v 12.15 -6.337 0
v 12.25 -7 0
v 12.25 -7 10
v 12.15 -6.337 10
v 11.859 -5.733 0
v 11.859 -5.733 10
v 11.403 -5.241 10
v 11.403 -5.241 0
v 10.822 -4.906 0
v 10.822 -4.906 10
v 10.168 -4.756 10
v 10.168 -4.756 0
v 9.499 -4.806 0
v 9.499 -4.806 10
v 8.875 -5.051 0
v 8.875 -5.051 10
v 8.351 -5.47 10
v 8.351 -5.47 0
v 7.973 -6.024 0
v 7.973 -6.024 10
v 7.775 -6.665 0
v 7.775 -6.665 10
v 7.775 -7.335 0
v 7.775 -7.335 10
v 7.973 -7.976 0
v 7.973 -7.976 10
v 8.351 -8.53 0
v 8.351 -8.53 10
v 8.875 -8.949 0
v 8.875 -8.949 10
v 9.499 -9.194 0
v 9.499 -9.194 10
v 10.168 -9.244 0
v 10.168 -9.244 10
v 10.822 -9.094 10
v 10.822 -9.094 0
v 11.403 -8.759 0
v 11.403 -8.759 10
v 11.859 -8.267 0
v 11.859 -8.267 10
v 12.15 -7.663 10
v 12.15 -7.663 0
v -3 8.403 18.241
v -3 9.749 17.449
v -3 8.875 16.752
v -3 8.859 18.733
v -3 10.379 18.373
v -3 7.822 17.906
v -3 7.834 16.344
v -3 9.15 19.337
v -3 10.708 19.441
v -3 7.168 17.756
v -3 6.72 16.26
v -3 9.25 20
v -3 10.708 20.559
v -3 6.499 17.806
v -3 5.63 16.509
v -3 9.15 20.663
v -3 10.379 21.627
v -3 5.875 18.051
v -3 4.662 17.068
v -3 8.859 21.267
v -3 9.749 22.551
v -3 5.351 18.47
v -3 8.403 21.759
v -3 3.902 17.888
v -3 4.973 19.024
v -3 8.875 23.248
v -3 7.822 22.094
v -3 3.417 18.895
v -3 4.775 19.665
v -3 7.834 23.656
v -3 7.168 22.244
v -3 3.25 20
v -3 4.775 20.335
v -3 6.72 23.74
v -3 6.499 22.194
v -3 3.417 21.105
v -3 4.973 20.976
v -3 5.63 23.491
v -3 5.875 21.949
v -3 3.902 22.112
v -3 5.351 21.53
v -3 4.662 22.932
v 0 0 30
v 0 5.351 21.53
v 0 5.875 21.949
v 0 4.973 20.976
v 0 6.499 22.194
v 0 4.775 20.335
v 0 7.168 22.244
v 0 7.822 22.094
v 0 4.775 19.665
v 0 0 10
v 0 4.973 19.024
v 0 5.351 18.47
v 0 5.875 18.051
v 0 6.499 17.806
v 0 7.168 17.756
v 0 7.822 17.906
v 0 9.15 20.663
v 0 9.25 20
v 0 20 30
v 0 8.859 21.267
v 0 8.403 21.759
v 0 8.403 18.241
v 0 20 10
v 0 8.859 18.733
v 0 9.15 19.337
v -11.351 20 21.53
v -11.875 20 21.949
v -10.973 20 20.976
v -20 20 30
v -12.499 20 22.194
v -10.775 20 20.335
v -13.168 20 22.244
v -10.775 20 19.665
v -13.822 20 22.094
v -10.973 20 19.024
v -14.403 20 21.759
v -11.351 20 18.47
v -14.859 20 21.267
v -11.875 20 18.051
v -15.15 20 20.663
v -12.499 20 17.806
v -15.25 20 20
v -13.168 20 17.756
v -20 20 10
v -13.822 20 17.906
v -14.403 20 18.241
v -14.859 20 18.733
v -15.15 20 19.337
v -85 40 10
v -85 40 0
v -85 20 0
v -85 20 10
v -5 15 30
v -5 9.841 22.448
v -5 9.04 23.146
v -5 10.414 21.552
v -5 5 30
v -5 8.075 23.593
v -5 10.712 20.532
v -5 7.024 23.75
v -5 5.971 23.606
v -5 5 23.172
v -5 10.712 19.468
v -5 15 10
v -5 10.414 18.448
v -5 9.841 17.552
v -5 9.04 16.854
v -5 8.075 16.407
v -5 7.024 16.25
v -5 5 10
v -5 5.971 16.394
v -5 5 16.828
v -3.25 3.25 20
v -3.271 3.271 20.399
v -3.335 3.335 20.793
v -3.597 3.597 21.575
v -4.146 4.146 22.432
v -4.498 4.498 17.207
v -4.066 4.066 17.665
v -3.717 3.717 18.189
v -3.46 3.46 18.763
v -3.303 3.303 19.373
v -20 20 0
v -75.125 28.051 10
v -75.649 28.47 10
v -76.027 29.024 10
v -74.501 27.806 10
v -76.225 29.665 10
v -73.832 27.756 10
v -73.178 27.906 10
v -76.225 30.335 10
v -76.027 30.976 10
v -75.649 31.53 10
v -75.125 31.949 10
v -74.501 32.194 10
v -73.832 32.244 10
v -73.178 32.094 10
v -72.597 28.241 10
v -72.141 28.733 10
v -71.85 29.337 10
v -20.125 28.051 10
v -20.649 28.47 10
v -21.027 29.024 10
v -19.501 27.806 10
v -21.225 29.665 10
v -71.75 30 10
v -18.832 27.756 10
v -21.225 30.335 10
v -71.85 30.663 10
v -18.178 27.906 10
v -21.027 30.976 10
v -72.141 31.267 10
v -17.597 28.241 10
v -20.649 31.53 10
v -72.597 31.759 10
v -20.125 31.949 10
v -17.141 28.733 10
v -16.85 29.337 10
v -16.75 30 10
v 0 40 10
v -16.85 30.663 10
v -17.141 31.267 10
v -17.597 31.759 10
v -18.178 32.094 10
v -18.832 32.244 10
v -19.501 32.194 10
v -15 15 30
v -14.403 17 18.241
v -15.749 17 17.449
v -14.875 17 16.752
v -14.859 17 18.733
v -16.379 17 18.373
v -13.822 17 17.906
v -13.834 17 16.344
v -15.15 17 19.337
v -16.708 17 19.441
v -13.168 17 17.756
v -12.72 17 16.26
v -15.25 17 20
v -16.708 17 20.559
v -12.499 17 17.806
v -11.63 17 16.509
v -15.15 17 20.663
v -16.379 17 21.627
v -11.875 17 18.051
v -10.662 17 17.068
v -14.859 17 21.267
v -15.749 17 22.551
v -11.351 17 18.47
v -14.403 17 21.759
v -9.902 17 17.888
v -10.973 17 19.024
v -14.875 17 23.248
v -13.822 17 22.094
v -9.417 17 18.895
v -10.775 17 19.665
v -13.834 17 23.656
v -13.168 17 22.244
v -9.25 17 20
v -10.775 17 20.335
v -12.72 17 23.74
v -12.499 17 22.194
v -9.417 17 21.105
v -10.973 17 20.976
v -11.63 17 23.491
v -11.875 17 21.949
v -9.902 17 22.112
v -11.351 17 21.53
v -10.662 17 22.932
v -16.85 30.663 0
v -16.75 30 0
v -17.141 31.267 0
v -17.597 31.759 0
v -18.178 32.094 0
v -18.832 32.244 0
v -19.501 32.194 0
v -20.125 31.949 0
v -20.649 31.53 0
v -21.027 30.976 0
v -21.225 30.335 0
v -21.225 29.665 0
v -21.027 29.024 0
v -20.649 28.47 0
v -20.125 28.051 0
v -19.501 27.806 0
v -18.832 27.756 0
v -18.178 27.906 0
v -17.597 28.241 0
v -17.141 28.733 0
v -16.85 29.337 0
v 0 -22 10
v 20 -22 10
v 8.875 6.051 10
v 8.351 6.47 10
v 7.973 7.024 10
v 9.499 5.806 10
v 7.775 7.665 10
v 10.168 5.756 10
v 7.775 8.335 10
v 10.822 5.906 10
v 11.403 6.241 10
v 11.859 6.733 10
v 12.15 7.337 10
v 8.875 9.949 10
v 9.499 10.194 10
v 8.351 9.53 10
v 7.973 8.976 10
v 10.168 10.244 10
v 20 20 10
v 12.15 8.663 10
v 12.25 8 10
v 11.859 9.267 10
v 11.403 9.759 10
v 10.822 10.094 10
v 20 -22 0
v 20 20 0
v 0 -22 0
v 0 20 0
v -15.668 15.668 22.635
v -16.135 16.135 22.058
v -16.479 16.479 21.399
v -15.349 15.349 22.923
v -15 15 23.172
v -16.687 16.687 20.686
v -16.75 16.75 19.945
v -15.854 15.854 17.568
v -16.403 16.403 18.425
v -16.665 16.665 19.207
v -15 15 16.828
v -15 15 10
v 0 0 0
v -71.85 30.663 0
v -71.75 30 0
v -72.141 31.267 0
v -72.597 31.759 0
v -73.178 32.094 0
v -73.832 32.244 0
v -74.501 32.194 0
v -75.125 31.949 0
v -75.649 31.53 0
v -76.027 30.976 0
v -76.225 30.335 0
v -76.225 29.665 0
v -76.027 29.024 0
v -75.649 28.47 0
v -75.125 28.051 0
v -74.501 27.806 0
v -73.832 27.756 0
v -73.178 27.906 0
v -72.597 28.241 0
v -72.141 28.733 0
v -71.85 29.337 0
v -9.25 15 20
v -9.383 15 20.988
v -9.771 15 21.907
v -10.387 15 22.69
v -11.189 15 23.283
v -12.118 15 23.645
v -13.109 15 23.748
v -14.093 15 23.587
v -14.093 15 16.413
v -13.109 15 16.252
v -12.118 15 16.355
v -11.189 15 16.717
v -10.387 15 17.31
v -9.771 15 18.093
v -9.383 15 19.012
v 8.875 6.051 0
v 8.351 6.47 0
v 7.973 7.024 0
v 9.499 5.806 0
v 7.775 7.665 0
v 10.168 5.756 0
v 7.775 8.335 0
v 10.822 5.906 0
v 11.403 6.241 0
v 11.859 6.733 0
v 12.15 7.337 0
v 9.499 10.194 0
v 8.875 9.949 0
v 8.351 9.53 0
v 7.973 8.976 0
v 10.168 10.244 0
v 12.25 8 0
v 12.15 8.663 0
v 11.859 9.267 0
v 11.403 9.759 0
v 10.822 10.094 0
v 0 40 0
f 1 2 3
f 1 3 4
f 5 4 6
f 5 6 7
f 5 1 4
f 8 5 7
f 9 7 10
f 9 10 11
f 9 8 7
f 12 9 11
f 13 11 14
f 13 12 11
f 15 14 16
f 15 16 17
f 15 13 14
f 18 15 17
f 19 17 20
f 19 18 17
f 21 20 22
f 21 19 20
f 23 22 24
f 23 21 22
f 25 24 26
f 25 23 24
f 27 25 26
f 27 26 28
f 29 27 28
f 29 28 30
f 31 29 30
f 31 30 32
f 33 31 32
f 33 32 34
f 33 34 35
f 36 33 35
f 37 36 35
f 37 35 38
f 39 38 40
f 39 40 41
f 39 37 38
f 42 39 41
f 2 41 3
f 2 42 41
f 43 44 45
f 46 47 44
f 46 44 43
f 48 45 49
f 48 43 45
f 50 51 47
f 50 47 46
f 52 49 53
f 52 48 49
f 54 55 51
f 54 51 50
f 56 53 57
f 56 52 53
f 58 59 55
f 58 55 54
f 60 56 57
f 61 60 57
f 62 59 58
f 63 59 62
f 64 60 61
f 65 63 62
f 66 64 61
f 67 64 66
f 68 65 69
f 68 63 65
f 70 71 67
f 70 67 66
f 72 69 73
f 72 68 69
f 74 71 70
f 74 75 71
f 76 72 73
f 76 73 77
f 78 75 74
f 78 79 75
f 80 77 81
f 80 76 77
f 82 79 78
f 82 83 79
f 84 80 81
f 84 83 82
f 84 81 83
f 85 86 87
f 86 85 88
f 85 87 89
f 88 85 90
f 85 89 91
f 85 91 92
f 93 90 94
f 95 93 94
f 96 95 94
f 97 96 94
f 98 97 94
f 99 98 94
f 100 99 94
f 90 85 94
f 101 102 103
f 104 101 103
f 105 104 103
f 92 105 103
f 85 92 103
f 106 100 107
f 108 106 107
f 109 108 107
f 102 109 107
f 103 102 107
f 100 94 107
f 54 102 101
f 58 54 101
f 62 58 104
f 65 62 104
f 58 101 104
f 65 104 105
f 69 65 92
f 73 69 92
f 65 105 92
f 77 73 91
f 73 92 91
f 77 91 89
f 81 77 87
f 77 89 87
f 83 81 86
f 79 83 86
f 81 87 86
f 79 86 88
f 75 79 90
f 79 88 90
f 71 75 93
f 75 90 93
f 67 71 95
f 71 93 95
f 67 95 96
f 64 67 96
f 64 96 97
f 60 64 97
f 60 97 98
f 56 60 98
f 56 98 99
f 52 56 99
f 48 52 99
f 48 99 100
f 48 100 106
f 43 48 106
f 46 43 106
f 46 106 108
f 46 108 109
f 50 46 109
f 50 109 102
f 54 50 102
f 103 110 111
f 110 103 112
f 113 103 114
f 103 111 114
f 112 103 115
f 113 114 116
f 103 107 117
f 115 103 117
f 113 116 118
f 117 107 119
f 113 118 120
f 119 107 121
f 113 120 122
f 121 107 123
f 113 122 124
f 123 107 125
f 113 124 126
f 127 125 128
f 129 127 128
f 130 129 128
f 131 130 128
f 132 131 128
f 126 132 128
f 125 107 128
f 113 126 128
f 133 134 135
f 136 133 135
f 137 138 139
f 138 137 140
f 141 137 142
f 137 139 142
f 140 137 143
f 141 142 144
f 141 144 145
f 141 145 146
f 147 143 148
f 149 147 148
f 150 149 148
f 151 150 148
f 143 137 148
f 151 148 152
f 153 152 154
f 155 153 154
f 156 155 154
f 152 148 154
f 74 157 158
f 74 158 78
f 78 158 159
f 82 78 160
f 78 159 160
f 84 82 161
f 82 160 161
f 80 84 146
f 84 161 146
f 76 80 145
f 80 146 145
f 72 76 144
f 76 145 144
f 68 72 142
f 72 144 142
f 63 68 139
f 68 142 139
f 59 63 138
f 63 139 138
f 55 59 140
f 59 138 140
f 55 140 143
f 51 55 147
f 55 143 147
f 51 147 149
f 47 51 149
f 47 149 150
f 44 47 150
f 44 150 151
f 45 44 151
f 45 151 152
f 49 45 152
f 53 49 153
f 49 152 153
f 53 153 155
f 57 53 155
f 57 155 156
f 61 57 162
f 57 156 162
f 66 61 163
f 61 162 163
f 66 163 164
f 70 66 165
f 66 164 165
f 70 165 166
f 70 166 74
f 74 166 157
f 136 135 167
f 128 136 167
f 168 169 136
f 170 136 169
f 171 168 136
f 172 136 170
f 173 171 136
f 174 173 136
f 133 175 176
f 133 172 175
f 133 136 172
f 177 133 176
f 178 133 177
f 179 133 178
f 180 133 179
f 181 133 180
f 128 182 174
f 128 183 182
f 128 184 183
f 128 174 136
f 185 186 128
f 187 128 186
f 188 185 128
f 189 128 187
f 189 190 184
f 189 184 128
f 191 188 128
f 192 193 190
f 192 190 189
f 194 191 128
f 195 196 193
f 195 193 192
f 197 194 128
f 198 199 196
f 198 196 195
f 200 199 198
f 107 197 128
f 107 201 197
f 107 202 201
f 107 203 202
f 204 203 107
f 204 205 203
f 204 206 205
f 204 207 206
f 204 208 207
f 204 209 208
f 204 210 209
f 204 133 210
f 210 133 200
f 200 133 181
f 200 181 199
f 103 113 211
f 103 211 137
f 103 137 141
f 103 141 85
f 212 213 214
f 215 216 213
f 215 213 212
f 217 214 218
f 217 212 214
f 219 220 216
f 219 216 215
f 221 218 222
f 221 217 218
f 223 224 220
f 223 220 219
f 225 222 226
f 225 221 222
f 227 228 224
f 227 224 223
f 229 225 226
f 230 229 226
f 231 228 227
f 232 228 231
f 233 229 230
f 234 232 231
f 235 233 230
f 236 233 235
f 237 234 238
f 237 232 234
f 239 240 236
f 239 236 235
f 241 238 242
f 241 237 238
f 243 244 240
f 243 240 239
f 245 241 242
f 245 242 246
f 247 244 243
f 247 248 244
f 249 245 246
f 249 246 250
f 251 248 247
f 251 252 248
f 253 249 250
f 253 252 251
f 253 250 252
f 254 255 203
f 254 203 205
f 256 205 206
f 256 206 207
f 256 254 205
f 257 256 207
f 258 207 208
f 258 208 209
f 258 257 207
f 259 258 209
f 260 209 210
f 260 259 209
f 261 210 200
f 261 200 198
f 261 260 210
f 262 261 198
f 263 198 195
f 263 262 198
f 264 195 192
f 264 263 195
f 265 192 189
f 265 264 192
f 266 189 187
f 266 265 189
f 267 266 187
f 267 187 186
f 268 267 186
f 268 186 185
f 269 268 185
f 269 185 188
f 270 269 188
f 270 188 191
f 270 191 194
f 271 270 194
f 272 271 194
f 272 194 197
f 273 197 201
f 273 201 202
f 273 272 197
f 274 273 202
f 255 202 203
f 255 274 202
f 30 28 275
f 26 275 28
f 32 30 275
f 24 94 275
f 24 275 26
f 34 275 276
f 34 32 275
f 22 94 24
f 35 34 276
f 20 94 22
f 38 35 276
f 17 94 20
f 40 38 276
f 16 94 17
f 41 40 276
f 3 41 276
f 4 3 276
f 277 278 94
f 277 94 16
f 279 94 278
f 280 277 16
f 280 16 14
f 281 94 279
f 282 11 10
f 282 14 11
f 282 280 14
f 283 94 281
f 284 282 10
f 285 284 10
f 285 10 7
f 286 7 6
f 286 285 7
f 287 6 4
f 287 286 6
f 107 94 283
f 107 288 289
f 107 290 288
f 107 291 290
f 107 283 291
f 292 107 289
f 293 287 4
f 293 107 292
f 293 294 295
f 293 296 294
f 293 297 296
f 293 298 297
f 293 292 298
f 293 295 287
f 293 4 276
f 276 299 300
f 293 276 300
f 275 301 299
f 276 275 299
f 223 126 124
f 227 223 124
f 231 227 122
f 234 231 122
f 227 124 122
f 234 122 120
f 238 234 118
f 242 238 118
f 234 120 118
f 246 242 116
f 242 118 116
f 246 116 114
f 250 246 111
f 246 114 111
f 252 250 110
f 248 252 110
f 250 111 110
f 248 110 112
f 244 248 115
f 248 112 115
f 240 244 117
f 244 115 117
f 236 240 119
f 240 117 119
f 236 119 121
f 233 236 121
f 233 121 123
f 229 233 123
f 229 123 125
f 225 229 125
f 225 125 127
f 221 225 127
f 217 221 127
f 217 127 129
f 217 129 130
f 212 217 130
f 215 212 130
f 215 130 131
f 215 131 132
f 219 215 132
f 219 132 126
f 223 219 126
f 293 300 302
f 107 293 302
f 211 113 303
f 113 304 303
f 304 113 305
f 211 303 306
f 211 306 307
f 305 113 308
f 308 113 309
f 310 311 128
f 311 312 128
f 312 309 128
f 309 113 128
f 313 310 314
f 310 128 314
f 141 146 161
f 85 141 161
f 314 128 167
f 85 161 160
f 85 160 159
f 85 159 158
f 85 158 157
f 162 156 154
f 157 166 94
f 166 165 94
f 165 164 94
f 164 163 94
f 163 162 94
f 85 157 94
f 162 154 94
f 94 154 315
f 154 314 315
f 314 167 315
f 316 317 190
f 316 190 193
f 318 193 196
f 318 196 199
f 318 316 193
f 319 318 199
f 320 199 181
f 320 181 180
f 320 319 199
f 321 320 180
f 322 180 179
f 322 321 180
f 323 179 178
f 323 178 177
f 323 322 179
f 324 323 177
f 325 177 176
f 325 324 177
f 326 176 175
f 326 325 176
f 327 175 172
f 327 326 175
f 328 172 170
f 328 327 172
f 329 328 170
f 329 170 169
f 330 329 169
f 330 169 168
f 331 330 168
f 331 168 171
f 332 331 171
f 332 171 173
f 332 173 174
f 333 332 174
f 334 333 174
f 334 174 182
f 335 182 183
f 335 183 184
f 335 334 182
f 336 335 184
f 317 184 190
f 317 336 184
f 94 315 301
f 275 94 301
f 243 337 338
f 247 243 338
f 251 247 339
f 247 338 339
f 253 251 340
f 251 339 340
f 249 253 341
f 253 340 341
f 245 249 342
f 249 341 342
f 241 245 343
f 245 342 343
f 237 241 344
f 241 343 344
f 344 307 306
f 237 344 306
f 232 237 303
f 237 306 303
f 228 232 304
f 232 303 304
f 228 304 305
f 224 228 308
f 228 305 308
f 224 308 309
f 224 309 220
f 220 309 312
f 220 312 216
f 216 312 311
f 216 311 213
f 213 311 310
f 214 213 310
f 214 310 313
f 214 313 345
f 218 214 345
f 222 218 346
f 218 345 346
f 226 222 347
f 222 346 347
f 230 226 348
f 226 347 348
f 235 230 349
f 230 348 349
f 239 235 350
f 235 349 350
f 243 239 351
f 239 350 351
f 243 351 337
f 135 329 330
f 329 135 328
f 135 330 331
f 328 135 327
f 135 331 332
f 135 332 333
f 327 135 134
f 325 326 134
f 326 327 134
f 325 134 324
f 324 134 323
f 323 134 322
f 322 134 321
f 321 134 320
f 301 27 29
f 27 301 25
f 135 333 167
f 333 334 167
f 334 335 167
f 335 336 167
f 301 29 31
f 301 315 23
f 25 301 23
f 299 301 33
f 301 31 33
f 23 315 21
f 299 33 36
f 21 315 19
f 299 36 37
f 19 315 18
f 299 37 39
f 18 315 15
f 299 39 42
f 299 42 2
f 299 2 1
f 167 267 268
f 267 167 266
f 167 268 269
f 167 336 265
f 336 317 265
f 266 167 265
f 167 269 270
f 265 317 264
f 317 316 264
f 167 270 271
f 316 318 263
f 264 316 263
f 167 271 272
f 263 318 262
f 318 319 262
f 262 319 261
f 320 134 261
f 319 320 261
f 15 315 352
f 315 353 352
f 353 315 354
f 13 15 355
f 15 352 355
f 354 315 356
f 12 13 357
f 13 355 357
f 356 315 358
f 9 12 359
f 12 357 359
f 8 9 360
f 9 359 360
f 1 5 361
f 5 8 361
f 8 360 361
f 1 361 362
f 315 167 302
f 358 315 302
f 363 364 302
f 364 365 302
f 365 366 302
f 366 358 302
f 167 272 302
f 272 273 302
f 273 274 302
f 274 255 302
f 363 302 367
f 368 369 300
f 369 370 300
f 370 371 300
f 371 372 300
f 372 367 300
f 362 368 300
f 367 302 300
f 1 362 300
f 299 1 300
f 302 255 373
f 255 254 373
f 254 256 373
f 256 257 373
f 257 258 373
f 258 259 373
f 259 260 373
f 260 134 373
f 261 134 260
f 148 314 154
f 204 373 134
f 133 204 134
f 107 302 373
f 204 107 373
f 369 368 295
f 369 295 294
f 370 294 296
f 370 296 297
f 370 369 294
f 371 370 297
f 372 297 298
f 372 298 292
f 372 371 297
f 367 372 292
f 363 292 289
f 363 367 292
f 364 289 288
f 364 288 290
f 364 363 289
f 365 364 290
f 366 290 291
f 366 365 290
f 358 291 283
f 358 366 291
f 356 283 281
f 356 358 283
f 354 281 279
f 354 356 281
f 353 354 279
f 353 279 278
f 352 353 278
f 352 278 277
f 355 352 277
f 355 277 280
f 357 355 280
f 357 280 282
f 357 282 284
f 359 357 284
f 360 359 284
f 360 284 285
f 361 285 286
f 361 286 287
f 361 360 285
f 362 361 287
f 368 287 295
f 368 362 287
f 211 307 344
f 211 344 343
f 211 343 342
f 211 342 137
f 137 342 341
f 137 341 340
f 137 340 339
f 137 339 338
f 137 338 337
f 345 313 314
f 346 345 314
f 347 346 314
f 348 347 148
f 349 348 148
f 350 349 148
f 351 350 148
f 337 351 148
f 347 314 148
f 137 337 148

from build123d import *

# Parameters (mm, degrees)
F0_R      = 2.25
F1_DEPTH  = 10
F3_DEPTH  = 20
F4_R      = 2.25
F5_DEPTH  = 5
F6_R      = 2.25
F7_DEPTH  = 10
F8_R      = 3.75
F9_DEPTH  = 2
F10_R     = 3.75
F11_DEPTH = 2


with BuildPart() as f1:
    # F0 (on Top) → F1 (new body)
    with BuildSketch(Plane.XY):
        Polygon((-20, 20), (0, 0), (0, -22), (20, -22), (20, 20), (0, 20), (0, 40), (-85, 40), (-85, 20), align=None)
        with Locations((10, -7)):
            Circle(F0_R, mode=Mode.SUBTRACT)
        with Locations((10, 8)):
            Circle(F0_R, mode=Mode.SUBTRACT)
        with Locations((-74, 30)):
            Circle(F0_R, mode=Mode.SUBTRACT)
        with Locations((-19, 30)):
            Circle(F0_R, mode=Mode.SUBTRACT)
    extrude(amount=F1_DEPTH)

    # F2 (on face) → F3 (join)
    with BuildSketch(Plane.XY.offset(10)):
        Polygon((0, 0), (0, 20), (-20, 20), (-15, 15), (-10, 15), (-5, 15), (-5, 10), (-5, 5), align=None)
    extrude(amount=F3_DEPTH)

    # F4 (on face) → F5 (cut)
    with BuildSketch(Plane.YZ):
        with Locations((7, 20)):
            Circle(F4_R)
    extrude(amount=-F5_DEPTH, mode=Mode.SUBTRACT)

    # F6 (on face) → F7 (cut)
    with BuildSketch(Plane(origin=(0, 20, 0), x_dir=(-1, 0, 0), z_dir=(0, 1, 0))):
        with Locations((13, 20)):
            Circle(F6_R)
    extrude(amount=-F7_DEPTH, mode=Mode.SUBTRACT)

    # F8 (on face) → F9 (cut)
    with BuildSketch(Plane.XZ.offset(-15)):
        with Locations((-13, 20)):
            Circle(F8_R)
    extrude(amount=-F9_DEPTH, mode=Mode.SUBTRACT)

    # F10 (on face) → F11 (cut)
    with BuildSketch(Plane(origin=(-5, 0, 0), x_dir=(0, -1, 0), z_dir=(-1, 0, 0))):
        with Locations((-7, 20)):
            Circle(F10_R)
    extrude(amount=-F11_DEPTH, mode=Mode.SUBTRACT)


solid = f1.part
